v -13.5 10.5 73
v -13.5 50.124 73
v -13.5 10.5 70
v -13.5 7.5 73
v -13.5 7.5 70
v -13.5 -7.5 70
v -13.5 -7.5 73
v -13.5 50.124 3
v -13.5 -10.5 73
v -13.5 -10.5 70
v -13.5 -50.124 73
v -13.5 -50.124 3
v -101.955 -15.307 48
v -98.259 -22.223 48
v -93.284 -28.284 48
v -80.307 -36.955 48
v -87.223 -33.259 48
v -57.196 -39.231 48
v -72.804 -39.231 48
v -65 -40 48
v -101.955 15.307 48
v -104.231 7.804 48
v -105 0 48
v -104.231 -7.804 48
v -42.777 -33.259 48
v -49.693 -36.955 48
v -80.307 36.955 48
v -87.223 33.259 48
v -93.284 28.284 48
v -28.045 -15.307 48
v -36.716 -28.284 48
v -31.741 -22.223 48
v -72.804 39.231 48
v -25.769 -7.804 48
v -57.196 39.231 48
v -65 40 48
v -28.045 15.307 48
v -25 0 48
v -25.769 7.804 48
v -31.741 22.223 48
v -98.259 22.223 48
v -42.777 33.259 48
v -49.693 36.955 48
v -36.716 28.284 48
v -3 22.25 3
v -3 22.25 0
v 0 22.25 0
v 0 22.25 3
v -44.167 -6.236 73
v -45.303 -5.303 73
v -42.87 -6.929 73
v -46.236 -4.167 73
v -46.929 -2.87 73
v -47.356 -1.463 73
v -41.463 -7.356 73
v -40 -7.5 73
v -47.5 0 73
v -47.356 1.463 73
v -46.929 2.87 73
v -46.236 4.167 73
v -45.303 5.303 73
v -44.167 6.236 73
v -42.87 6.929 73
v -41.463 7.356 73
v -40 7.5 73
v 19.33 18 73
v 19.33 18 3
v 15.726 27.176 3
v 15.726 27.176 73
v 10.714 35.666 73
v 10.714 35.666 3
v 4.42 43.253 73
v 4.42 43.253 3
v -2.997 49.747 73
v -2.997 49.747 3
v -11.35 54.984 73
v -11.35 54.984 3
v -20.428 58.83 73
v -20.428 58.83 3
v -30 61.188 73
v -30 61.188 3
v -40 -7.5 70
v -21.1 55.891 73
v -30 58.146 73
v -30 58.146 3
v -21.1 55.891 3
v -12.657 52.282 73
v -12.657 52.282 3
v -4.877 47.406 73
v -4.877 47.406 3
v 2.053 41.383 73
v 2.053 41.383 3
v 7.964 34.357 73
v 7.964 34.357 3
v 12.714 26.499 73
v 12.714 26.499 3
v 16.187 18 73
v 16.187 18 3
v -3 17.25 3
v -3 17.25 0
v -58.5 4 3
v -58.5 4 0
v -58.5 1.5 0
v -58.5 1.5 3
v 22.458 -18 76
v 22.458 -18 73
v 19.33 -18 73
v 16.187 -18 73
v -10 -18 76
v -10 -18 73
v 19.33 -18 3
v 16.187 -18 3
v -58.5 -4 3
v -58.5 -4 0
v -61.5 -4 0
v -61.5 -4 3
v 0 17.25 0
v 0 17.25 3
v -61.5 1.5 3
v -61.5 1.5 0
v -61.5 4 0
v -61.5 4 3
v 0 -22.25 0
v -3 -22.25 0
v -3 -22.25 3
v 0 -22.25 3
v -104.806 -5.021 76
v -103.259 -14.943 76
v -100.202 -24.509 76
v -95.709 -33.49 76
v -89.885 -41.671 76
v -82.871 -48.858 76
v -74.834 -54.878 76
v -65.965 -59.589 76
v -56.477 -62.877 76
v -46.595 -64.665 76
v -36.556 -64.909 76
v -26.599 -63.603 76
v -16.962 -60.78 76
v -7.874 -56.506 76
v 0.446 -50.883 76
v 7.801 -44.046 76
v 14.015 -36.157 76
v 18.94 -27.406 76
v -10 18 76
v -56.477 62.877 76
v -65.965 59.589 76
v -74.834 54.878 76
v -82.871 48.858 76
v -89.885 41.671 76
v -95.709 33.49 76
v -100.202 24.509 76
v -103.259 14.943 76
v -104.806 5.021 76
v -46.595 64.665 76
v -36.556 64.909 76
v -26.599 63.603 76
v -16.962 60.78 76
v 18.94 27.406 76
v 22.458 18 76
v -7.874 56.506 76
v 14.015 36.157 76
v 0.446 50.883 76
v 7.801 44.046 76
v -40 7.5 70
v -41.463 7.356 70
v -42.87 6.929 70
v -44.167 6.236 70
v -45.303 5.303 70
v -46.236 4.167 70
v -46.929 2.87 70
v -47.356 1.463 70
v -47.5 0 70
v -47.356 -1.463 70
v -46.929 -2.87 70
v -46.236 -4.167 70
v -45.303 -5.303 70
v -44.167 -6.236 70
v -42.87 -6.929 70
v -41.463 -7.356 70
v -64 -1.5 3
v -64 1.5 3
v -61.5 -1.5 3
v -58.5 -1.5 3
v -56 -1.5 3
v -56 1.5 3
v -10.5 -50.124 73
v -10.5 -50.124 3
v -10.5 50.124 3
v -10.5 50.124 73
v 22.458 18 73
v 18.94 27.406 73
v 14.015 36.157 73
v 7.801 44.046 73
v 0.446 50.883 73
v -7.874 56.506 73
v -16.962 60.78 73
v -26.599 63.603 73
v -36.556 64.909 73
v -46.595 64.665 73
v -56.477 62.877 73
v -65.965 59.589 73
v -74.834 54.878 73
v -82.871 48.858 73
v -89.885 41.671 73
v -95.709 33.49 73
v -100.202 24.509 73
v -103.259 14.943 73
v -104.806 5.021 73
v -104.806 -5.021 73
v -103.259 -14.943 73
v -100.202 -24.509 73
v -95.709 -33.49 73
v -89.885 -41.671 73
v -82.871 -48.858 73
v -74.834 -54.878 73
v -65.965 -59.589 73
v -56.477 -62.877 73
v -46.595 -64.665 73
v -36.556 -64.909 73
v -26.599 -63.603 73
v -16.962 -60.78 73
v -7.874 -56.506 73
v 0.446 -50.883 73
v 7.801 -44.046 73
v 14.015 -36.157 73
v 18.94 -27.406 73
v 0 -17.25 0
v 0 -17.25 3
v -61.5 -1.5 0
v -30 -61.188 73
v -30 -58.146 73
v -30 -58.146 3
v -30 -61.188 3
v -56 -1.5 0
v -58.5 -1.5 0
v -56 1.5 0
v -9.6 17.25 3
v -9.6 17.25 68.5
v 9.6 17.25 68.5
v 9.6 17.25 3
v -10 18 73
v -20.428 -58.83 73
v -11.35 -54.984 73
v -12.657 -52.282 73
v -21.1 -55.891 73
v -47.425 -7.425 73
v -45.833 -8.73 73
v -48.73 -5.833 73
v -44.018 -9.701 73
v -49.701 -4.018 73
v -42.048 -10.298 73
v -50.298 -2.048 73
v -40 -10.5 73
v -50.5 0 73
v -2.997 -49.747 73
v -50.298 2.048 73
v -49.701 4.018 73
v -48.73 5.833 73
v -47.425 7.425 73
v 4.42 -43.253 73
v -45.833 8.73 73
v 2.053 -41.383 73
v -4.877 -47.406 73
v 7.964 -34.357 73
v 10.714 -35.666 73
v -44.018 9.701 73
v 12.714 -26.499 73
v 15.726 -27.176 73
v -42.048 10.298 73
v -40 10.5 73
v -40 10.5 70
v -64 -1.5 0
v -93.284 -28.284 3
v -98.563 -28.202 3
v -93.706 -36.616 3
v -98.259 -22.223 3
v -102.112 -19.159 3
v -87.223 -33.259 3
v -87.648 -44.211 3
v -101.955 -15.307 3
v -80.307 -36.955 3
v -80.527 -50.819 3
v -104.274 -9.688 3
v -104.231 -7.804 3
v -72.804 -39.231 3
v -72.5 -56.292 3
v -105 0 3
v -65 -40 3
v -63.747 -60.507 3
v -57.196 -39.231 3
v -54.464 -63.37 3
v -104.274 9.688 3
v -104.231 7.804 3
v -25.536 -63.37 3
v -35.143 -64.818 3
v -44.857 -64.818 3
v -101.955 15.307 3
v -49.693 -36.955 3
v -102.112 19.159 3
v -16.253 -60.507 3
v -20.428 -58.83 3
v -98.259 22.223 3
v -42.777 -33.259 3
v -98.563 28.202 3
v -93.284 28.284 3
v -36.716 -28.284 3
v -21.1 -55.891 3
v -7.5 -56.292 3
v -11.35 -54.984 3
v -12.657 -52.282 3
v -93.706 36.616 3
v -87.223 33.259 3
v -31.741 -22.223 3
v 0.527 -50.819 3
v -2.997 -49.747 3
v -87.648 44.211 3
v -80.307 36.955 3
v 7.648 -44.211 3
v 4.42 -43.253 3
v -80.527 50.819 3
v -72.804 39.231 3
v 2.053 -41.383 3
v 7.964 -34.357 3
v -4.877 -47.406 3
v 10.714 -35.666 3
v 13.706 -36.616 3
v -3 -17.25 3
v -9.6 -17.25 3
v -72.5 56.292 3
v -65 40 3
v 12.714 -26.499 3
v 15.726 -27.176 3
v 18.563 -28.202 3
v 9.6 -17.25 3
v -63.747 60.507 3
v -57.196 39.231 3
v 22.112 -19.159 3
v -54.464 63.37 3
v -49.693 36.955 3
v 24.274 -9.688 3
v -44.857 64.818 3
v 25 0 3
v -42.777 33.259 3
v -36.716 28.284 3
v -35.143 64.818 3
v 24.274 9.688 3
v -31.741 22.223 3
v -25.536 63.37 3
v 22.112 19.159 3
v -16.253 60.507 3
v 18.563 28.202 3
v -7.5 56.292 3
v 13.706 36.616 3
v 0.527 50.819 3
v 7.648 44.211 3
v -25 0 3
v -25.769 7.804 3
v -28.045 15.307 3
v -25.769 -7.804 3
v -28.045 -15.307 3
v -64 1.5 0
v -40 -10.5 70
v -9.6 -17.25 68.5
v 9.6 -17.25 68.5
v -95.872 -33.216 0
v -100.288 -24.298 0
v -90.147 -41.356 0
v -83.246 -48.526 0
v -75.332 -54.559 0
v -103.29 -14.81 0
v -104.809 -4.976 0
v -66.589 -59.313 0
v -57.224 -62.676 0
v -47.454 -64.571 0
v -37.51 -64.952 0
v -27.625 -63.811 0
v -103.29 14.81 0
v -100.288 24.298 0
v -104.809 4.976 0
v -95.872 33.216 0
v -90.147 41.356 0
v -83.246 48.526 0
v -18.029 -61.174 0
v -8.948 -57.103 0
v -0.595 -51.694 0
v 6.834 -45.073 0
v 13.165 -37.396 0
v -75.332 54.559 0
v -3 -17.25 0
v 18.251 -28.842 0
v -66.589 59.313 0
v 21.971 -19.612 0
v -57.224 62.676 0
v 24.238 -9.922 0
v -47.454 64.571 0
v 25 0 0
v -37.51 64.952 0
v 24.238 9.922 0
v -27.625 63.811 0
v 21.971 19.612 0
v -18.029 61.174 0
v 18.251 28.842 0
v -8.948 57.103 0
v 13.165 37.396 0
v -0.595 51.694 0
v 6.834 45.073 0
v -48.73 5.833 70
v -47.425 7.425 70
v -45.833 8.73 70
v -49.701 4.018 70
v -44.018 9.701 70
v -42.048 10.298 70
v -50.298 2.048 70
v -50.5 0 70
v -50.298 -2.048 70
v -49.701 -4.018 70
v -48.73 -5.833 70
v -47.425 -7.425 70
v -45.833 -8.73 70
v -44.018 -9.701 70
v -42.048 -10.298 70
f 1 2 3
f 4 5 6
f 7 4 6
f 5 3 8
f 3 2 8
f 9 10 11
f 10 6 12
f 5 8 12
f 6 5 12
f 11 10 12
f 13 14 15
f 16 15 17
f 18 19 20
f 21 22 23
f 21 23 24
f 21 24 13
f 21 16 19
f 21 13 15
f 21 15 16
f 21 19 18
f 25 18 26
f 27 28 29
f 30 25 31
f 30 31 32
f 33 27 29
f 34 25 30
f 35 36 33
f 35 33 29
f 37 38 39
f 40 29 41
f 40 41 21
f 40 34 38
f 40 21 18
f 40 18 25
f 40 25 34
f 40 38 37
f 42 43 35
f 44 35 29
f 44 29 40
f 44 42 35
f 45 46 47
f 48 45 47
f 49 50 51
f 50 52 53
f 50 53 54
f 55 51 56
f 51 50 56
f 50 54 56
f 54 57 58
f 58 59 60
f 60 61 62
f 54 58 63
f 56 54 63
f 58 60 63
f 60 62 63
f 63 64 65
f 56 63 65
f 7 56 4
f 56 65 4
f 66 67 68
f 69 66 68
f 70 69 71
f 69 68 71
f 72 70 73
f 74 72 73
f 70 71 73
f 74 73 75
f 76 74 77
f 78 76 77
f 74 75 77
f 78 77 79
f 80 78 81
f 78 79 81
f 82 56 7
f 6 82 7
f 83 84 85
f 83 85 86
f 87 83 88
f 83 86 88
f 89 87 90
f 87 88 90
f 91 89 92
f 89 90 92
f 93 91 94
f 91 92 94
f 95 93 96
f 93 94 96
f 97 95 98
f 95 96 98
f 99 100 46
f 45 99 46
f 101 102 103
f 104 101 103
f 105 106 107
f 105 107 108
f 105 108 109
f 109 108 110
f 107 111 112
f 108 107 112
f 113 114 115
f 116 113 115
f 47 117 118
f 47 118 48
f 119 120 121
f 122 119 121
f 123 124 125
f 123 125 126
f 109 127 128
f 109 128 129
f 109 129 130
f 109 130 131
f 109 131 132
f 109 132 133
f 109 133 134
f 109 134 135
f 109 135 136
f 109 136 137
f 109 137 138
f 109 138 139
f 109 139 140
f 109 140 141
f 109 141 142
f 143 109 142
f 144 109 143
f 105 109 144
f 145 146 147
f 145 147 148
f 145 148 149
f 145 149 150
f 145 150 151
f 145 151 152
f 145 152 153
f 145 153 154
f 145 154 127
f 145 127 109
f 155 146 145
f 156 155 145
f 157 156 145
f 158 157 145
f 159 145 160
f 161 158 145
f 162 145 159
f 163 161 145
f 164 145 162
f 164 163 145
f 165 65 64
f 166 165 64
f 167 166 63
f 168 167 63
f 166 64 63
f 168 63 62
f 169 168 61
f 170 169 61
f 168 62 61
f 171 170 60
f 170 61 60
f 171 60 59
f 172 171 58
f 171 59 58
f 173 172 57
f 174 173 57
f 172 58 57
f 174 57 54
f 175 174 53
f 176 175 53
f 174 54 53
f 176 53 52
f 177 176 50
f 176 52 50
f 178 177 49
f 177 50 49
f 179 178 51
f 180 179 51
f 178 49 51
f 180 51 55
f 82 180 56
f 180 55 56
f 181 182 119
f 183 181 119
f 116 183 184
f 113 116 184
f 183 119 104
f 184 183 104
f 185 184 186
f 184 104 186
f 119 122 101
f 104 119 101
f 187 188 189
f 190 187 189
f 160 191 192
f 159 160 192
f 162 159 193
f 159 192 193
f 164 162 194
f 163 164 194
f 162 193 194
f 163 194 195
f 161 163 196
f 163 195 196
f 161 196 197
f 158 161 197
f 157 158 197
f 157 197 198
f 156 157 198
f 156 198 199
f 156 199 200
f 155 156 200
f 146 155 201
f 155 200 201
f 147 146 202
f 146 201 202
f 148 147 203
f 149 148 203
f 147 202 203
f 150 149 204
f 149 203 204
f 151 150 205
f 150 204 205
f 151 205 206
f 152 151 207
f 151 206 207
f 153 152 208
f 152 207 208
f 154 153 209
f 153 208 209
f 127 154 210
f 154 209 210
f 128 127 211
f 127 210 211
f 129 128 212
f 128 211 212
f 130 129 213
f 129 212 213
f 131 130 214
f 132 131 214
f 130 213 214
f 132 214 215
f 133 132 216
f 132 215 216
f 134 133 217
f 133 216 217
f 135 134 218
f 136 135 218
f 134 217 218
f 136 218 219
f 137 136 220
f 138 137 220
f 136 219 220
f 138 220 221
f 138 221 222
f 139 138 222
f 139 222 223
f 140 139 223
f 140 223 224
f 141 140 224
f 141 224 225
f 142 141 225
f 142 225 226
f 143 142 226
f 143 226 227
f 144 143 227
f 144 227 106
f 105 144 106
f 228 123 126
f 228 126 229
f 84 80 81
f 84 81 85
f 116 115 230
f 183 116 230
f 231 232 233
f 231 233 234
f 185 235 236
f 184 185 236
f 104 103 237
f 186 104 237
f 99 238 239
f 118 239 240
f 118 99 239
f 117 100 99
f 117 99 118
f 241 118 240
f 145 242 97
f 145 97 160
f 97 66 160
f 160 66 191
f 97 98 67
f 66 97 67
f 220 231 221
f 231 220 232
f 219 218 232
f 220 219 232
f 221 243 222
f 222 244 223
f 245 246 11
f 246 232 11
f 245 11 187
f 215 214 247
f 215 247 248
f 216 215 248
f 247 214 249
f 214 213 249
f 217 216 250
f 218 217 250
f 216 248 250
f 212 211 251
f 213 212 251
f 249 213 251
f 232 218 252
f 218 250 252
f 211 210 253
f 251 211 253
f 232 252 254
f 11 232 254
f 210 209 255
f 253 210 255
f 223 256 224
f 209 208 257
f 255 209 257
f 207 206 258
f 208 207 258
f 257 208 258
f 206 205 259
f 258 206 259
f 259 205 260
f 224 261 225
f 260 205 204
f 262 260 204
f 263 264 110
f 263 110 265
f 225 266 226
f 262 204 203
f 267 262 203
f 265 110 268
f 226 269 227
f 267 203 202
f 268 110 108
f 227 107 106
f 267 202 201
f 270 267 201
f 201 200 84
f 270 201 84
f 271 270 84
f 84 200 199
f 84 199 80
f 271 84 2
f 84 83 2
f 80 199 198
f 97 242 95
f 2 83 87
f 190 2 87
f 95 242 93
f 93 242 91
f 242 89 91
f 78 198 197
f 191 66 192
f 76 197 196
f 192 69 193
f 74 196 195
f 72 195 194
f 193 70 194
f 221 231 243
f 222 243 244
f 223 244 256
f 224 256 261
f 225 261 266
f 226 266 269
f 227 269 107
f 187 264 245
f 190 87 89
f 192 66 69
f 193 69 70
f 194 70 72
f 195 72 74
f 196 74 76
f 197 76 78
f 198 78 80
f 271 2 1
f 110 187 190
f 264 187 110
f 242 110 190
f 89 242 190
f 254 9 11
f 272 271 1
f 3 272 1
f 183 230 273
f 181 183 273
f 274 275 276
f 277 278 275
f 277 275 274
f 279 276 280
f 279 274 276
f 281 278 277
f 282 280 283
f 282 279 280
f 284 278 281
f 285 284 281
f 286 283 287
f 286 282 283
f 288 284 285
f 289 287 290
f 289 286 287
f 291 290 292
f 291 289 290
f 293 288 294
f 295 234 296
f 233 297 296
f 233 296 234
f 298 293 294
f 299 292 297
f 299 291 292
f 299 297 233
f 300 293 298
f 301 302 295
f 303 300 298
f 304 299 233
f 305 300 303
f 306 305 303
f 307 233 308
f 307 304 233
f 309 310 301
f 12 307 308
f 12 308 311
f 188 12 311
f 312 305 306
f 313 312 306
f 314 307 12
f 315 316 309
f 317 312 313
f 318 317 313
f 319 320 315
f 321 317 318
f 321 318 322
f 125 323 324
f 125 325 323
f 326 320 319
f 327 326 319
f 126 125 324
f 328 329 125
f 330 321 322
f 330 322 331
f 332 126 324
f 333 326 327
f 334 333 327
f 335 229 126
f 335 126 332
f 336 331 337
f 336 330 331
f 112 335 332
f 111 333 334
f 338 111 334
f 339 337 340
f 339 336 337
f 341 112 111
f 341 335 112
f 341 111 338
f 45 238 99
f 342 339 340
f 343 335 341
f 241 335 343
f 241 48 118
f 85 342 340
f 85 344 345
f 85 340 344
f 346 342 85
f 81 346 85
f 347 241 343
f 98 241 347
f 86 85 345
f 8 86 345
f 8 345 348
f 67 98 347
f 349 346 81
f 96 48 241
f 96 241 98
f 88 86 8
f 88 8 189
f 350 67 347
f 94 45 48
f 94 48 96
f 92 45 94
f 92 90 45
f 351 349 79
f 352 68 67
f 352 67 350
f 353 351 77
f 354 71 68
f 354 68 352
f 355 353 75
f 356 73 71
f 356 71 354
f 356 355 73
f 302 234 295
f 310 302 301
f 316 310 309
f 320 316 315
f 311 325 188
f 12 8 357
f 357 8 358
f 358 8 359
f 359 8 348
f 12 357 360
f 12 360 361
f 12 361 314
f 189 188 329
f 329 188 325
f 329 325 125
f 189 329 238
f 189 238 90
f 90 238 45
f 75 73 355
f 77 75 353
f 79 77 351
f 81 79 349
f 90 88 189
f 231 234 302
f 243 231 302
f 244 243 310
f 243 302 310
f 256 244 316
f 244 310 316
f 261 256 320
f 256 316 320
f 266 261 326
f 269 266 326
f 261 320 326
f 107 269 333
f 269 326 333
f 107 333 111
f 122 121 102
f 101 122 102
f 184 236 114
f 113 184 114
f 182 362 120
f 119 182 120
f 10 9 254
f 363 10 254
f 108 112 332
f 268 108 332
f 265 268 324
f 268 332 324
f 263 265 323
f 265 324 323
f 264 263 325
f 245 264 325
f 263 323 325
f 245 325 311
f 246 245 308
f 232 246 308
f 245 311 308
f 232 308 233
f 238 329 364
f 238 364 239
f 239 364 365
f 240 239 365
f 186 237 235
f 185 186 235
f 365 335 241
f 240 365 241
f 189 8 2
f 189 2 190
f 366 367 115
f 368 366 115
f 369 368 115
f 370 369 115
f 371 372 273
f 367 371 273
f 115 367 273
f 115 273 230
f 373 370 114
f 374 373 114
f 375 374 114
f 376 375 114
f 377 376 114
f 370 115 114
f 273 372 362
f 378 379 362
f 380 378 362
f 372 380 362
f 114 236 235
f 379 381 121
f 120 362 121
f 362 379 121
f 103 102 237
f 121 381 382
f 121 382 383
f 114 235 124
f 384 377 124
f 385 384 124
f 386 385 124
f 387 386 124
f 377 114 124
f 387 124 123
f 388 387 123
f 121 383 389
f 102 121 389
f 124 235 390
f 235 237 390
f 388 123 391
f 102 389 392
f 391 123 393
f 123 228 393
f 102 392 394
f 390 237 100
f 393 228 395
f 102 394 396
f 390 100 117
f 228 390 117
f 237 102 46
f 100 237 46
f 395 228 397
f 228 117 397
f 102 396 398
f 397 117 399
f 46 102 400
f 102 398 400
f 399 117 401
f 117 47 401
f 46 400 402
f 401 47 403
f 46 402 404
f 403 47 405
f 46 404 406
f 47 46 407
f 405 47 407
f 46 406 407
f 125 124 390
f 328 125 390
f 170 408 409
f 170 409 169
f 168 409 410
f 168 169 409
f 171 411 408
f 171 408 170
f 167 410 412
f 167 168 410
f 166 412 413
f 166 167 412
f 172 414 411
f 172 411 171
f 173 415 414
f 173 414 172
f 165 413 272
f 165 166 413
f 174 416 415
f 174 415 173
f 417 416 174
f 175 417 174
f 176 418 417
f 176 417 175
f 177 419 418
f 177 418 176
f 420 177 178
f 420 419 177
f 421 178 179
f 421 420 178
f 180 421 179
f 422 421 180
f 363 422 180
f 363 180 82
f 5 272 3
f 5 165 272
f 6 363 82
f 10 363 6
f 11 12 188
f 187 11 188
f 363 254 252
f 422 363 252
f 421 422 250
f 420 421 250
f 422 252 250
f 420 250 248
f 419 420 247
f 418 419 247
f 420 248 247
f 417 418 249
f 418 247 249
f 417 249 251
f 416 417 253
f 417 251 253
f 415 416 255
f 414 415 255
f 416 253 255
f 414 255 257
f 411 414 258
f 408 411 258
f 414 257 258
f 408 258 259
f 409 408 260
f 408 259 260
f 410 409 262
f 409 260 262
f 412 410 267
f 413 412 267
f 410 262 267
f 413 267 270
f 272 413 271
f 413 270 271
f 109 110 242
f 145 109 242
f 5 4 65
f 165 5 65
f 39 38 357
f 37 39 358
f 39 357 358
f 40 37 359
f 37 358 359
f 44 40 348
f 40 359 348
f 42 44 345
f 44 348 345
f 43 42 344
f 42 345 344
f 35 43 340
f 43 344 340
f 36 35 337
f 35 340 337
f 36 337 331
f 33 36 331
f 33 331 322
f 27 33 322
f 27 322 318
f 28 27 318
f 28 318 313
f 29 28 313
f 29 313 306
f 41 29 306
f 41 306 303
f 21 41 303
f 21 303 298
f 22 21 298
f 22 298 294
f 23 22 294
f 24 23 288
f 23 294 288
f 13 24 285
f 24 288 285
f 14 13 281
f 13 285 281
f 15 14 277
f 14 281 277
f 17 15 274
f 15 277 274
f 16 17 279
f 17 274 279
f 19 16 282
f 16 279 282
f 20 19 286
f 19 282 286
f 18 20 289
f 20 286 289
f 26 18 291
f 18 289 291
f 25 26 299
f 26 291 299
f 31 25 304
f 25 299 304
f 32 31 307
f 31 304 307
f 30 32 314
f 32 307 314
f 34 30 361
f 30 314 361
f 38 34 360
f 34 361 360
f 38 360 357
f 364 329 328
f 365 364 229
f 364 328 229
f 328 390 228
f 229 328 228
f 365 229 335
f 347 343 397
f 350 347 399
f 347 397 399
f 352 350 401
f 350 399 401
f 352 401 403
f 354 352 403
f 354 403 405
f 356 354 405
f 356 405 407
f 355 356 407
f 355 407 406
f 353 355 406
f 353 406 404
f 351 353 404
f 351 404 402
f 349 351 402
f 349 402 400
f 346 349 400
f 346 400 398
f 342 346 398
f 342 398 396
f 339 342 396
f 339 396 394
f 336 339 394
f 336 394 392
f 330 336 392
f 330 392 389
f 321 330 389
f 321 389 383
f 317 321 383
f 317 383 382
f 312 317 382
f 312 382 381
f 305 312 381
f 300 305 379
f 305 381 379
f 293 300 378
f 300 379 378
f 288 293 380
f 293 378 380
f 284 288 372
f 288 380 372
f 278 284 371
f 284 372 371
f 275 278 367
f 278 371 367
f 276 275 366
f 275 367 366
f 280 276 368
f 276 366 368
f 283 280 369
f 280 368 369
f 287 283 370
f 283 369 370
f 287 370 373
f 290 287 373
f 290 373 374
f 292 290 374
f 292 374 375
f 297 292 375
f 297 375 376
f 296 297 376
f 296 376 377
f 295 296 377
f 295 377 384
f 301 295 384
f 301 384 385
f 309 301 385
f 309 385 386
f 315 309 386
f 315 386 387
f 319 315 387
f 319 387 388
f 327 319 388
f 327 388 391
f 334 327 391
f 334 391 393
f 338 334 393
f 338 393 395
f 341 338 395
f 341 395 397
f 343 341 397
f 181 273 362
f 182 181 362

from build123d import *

# Parameters (mm, degrees)
F0_W      = 19.2
F0_H      = 34.5
F1_DEPTH  = 68.5
F2_R      = 65
F2_W      = 3
F2_H      = 5
F3_DEPTH  = 3
F4_R      = 40
F5_DEPTH  = 45
F6_W      = 3
F6_H      = 36
F6_H_2    = 32.1239784062
F7_DEPTH  = 70
F11_DEPTH = 3
F13_DEPTH = 3


# Not quite as in the source:
# - a feature names something its author has since deleted; it is built from what else it names
# - the program builds the solid bodies; features that only make, move or delete a surface that nothing else refers to are left out


with BuildPart() as f1:
    # F0 (on Top) → F1 (new body)
    with BuildSketch(Plane.XY):
        Rectangle(F0_W, F0_H)
    extrude(amount=F1_DEPTH)

    # F2 (on Top) → F3 (join)
    with BuildSketch(Plane.XY):
        with Locations((-40, 0)):
            Circle(F2_R)
        with Locations((-13.5, -12.5)):
            Rectangle(F2_W, F2_H, mode=Mode.SUBTRACT)
        with Locations((-1.5, -19.75)):
            Rectangle(F2_W, F2_H, mode=Mode.SUBTRACT)
        Polygon((-58.5, -4), (-61.5, -4), (-61.5, -1.5), (-64, -1.5), (-64, 1.5), (-61.5, 1.5), (-61.5, 4), (-58.5, 4), (-58.5, 1.5), (-56, 1.5), (-56, -1.5), (-58.5, -1.5), align=None, mode=Mode.SUBTRACT)
        with Locations((-1.5, 19.75)):
            Rectangle(F2_W, F2_H, mode=Mode.SUBTRACT)
        with Locations((-13.5, -12.5)):
            Rectangle(F2_W, F2_H)
    extrude(amount=F3_DEPTH)

    # F4 (on face) → F5 (join)
    with BuildSketch(Plane.XY.offset(3)):
        with Locations((-65, 0)):
            Circle(F4_R)
    extrude(amount=F5_DEPTH)

    # F6 (on face) → F7 (join)
    with BuildSketch(Plane.XY.offset(3)):
        with Locations((-12, 0)):
            Rectangle(F6_W, F6_H)
        with Locations((-12, 34.0619892031)):
            Rectangle(F6_W, F6_H_2)
        with Locations((-12, -34.0619892031)):
            Rectangle(F6_W, F6_H_2)
        with BuildLine():
            Line((19.3295878968, -18), (16.1871871515, -18))
            ThreePointArc((16.1871871515, -18), (-1.2944625099, -44.5295561128), (-30, -58.1463670404))
            Line((-30, -58.1463670404), (-30, -61.1882341631))
            ThreePointArc((-30, -61.1882341631), (0.8405904954, -46.6481100151), (19.3295878968, -18))
        make_face()
        with BuildLine():
            Line((-30, 61.1882341631), (-30, 58.1463670404))
            ThreePointArc((-30, 58.1463670404), (-1.2944625099, 44.5295561128), (16.1871871515, 18))
            Line((16.1871871515, 18), (19.3295878968, 18))
            ThreePointArc((19.3295878968, 18), (0.8405904954, 46.6481100151), (-30, 61.1882341631))
        make_face()
    extrude(amount=F7_DEPTH)

    # F10 (on offset) → F11 (join)
    with BuildSketch(Plane.XY.offset(73)):
        with BuildLine():
            ThreePointArc((22.4579858785, 18), (-105, 0), (22.4579858785, -18))
            Line((22.4579858785, -18), (-10, -18))
            Line((-10, -18), (-10, 18))
            Line((-10, 18), (22.4579858785, 18))
        make_face()
    extrude(amount=F11_DEPTH)

    # F12 (on face) → F13 (join)
    with BuildSketch(Plane(origin=(0, 0, 73), x_dir=(1, 0, 0), z_dir=(0, 0, -1))):
        with BuildLine():
            Line((-13.5, -10.5), (-13.5, -7.5))
            Line((-13.5, -7.5), (-40, -7.5))
            ThreePointArc((-40, -7.5), (-47.5, 0), (-40, 7.5))
            Line((-40, 7.5), (-13.5, 7.5))
            Line((-13.5, 7.5), (-13.5, 10.5))
            Line((-13.5, 10.5), (-40, 10.5))
            ThreePointArc((-40, 10.5), (-50.5, 0), (-40, -10.5))
            Line((-40, -10.5), (-13.5, -10.5))
        make_face()
    extrude(amount=F13_DEPTH)


solid = f1.part
